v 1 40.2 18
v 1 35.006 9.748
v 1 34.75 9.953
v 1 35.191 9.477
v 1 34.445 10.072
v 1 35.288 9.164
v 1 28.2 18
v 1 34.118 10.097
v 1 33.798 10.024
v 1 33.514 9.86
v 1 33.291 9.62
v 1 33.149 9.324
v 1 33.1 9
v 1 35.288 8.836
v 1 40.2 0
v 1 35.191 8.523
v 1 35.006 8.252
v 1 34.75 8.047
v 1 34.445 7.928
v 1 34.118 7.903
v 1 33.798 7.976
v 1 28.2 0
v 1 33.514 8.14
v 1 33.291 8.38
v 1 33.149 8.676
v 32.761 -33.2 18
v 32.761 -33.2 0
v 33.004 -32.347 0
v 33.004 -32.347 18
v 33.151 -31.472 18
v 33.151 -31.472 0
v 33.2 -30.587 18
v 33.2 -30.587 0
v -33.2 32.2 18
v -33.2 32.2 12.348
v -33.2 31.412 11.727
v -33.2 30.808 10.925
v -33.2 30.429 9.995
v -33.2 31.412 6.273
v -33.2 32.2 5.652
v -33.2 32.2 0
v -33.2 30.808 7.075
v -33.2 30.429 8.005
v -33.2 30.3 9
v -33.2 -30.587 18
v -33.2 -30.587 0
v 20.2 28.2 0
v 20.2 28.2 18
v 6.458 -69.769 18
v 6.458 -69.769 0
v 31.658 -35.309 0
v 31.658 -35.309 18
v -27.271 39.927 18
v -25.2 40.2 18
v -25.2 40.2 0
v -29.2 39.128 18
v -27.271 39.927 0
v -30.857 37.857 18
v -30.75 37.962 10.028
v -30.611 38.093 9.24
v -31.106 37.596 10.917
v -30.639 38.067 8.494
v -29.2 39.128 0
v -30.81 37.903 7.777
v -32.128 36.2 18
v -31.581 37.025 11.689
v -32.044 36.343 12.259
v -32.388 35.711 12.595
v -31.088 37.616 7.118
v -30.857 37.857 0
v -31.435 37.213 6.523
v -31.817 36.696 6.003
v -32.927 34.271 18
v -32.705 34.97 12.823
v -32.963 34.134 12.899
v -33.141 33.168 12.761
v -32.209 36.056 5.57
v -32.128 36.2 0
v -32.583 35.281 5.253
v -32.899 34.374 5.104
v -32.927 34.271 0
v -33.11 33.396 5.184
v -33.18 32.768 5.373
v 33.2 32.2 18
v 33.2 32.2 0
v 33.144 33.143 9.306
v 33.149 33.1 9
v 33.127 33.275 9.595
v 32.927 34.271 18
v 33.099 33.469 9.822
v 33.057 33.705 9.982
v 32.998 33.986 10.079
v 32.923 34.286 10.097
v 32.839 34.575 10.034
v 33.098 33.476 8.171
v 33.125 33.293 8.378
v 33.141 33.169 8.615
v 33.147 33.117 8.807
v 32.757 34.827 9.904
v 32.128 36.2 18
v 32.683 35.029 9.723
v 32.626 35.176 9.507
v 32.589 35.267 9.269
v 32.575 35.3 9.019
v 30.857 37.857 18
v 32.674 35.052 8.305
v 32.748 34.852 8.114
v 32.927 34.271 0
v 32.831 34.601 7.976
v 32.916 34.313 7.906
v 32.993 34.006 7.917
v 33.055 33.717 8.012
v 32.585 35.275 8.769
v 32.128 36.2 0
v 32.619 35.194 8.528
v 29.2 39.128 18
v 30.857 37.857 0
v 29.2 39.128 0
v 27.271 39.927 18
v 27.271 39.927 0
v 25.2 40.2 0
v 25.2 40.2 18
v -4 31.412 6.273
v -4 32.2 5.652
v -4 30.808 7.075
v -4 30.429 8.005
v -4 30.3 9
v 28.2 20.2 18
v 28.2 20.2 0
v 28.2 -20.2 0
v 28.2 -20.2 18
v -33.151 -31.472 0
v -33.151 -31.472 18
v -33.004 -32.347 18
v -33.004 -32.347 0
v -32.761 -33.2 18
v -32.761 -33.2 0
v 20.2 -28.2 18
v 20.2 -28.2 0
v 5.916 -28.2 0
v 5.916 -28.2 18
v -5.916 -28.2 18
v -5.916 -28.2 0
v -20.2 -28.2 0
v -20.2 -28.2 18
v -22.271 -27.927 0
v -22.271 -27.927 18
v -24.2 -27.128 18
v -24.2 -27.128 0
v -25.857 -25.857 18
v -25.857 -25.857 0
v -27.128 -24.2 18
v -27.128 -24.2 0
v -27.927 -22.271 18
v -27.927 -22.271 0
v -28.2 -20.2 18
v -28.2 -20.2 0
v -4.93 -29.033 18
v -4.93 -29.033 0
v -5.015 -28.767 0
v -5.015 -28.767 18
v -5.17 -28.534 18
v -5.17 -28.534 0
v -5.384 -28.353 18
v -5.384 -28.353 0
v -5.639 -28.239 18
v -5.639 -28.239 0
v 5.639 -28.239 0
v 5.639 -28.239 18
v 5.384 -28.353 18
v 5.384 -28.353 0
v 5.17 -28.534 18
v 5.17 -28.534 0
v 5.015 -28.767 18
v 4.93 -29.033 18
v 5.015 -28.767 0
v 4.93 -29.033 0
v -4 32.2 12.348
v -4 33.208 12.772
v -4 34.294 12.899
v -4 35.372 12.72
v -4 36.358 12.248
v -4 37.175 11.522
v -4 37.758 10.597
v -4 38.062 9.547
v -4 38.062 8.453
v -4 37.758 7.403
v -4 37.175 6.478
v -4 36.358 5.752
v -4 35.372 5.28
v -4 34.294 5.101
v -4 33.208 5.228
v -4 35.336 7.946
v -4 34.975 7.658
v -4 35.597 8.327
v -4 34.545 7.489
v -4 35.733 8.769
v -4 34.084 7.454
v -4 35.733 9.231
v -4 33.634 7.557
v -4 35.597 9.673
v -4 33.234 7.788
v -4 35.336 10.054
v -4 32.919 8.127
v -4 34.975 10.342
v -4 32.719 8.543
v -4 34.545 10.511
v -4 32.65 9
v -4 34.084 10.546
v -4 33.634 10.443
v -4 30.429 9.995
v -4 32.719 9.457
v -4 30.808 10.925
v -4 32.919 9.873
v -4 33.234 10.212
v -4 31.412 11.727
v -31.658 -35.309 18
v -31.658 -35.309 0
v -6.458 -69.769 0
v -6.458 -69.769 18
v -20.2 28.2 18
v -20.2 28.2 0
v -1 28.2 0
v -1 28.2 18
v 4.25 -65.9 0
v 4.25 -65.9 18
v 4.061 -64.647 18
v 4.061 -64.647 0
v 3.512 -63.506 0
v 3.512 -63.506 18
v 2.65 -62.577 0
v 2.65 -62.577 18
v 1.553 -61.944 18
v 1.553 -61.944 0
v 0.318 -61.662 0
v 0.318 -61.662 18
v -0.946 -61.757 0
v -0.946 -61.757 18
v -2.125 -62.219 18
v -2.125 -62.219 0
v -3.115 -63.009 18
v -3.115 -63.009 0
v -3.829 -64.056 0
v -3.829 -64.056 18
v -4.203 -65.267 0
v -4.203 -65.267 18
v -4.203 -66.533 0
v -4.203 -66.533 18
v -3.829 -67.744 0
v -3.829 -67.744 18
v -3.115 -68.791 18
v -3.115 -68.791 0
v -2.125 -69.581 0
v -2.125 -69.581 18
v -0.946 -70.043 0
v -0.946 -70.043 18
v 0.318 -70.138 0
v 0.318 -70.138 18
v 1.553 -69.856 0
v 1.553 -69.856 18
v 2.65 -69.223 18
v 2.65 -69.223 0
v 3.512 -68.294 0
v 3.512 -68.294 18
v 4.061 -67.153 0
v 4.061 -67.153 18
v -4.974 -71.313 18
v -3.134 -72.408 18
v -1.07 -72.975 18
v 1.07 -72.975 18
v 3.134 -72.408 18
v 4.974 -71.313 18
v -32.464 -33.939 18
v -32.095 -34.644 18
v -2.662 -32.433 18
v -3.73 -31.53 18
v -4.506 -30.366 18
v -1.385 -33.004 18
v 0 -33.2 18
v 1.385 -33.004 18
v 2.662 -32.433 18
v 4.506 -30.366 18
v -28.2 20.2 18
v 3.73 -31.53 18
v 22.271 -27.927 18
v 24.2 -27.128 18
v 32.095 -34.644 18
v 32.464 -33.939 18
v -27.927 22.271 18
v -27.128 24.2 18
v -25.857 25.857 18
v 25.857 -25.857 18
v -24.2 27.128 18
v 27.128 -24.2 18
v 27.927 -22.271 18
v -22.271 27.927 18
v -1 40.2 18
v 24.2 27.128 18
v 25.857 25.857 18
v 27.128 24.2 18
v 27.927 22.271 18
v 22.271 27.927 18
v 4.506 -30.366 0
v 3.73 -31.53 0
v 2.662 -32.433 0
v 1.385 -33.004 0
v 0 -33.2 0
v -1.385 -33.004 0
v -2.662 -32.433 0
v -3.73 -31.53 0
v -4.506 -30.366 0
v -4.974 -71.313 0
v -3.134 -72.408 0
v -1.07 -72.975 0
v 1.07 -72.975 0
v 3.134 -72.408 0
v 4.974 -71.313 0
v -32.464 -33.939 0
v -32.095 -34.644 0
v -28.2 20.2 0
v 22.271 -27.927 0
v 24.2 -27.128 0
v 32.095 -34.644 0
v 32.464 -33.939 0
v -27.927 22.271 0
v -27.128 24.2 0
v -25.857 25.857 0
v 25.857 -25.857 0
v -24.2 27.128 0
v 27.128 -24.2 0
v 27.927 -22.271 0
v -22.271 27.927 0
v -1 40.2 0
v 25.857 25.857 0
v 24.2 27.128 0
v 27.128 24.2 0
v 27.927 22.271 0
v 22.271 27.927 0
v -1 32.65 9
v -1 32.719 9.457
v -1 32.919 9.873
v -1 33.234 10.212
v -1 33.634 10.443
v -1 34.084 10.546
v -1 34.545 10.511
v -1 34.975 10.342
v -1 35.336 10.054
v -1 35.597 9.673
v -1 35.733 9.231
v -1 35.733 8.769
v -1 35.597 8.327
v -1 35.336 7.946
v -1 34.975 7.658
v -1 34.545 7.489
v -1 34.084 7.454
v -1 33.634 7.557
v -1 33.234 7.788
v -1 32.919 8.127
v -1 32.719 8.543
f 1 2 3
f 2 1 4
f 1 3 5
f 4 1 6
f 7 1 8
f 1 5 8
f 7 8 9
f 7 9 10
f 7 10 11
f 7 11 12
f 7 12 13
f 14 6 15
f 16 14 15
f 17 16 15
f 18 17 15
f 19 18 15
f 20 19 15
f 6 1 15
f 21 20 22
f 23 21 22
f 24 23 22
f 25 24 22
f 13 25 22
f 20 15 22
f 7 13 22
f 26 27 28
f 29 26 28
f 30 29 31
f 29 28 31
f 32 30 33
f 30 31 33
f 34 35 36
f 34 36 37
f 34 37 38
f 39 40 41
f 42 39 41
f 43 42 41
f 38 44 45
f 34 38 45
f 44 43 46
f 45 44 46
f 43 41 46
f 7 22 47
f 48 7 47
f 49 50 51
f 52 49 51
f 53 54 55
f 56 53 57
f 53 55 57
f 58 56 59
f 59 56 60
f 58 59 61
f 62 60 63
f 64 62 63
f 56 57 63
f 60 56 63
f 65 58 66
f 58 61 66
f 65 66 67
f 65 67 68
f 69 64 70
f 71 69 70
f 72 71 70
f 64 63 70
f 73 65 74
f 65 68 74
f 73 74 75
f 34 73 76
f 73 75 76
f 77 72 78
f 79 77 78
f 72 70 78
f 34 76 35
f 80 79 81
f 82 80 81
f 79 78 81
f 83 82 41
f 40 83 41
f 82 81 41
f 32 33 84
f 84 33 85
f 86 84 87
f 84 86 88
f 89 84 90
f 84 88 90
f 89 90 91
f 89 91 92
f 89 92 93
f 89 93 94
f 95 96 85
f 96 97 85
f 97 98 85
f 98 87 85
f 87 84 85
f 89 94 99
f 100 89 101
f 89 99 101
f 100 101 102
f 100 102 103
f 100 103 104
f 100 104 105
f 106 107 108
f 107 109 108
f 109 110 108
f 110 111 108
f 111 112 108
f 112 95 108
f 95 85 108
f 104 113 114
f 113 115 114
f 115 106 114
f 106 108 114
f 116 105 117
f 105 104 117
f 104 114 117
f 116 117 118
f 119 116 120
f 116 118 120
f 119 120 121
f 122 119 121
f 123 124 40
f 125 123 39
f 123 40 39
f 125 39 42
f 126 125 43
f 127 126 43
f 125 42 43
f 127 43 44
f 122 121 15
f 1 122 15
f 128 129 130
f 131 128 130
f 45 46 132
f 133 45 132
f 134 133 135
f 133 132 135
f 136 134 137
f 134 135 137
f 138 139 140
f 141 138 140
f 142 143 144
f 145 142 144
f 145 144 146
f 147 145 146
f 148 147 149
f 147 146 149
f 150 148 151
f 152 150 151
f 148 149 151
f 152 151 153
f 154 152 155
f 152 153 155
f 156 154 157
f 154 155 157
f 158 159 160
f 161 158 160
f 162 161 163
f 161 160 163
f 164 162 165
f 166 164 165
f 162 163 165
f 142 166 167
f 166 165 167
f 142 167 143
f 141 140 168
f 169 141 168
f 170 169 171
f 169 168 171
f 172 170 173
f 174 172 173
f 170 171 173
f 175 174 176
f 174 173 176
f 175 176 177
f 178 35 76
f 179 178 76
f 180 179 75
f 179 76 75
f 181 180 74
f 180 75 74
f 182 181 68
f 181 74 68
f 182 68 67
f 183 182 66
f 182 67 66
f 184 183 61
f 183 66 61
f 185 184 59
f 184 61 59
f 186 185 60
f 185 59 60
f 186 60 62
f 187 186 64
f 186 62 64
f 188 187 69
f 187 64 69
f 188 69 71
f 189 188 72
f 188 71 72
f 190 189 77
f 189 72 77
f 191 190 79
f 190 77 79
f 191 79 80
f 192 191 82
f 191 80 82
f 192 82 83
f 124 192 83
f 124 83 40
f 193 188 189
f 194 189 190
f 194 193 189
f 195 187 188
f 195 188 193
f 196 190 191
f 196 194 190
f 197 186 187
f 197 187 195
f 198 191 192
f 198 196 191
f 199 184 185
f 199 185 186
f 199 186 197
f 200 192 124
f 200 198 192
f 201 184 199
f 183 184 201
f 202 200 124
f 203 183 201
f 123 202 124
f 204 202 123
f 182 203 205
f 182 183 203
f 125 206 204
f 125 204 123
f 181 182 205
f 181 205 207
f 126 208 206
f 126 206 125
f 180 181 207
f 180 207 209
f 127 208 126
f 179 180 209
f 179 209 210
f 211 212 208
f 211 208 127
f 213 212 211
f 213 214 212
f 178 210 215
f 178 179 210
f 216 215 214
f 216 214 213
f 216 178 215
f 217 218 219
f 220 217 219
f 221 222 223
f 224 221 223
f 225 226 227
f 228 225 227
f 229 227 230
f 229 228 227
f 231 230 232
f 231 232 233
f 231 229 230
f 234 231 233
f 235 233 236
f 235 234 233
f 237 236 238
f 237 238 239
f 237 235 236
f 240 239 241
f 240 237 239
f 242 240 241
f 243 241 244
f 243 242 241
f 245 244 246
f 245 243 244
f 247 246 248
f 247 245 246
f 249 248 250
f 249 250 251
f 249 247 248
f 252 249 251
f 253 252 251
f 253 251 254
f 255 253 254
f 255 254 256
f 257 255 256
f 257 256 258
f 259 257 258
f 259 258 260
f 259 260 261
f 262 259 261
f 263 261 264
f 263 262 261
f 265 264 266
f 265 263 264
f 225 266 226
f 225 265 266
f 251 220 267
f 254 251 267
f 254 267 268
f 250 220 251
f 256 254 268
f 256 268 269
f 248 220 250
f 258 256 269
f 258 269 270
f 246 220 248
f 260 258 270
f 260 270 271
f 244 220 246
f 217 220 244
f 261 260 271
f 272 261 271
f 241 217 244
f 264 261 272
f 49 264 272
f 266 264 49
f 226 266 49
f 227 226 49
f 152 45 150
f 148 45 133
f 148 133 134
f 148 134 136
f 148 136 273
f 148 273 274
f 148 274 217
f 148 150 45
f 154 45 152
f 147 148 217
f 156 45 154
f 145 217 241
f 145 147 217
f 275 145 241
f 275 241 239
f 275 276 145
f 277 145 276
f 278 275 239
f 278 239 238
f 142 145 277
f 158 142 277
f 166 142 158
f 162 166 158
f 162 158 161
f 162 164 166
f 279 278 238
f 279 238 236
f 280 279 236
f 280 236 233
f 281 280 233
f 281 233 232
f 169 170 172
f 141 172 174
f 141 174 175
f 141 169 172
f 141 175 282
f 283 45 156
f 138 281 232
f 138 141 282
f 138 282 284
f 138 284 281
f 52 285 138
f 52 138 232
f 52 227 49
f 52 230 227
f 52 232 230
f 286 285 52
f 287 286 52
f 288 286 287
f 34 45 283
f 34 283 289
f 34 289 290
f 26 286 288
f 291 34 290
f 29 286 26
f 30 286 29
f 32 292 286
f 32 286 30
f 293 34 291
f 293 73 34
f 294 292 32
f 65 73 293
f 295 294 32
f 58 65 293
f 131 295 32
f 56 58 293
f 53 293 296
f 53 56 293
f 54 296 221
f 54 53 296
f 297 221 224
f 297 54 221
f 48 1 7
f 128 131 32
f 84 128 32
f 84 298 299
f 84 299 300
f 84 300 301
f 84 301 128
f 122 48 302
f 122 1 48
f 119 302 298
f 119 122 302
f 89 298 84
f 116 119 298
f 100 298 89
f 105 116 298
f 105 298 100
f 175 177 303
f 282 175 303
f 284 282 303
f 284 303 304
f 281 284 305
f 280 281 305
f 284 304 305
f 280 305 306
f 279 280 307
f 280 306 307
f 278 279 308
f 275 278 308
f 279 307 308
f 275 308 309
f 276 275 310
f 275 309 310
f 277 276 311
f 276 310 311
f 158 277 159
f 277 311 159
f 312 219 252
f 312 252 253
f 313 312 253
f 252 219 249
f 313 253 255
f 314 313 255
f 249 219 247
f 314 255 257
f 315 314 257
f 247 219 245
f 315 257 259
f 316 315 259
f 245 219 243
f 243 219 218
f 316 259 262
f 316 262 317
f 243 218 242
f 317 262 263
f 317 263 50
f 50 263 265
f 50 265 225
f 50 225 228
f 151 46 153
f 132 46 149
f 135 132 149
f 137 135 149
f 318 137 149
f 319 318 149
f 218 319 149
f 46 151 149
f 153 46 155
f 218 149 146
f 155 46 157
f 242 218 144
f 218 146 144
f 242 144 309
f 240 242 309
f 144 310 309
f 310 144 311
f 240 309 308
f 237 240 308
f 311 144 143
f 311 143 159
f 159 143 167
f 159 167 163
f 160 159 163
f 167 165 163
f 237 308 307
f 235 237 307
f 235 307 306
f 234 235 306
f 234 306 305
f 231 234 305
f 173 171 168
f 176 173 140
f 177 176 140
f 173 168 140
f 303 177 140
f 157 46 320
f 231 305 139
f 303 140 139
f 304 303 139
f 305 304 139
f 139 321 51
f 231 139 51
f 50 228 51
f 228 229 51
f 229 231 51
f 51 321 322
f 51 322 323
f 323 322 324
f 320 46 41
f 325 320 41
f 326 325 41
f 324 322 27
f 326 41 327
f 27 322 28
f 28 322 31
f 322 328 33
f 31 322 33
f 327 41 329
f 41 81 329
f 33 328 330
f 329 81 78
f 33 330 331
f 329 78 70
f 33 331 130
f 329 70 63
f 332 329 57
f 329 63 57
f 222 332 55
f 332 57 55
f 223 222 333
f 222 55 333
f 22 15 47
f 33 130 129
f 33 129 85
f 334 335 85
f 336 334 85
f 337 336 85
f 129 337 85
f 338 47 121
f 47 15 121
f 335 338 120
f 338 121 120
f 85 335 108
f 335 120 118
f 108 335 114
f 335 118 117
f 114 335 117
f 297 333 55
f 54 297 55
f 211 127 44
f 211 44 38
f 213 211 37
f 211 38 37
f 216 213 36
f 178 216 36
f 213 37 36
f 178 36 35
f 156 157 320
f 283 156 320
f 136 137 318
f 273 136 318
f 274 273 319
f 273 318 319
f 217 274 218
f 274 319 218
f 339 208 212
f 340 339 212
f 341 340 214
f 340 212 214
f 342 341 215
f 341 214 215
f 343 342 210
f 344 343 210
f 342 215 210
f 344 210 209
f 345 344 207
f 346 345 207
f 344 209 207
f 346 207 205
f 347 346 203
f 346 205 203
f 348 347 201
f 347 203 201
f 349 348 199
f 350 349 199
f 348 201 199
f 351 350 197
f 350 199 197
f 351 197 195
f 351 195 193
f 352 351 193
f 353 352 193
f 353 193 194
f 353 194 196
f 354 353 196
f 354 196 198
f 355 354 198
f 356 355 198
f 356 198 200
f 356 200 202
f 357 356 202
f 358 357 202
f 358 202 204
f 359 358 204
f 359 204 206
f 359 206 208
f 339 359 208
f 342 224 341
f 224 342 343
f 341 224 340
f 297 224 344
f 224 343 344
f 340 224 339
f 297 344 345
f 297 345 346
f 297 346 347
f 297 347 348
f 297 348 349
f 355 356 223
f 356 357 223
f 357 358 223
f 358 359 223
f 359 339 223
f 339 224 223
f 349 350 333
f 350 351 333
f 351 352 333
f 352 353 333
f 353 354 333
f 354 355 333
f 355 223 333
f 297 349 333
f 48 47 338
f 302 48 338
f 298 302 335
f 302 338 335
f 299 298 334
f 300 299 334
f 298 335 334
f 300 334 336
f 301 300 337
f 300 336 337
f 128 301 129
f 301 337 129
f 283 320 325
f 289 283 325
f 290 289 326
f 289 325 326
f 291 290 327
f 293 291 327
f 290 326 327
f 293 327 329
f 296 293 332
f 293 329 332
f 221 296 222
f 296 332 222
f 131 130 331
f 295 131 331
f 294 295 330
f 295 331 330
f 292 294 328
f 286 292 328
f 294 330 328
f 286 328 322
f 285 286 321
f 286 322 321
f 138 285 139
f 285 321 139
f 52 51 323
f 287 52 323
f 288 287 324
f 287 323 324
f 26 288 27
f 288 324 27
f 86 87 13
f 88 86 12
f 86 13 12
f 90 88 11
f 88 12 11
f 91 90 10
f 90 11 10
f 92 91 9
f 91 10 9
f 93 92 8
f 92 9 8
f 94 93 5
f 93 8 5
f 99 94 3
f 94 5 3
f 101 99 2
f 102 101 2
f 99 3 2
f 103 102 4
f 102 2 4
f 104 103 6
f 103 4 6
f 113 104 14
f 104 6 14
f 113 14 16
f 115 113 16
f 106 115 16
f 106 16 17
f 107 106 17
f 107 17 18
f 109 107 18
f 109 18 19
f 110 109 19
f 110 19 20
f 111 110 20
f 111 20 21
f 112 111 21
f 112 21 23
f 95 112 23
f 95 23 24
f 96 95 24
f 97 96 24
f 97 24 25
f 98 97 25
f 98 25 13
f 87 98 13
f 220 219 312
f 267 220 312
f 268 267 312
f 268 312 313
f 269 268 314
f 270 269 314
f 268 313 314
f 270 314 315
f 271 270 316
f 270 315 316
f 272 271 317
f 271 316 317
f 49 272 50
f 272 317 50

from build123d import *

# Parameters (mm, degrees)
F0_R     = 4.25
F1_DEPTH = 18
F2_R     = 1.1
F3_DEPTH = 66.401
F2_R_2   = 1.55
F4_DEPTH = 33.2
F5_DEPTH = 29.2


with BuildPart() as f1:
    # F0 (on Top) → F1 (new body)
    with BuildSketch(Plane.XY):
        with BuildLine():
            ThreePointArc((32.761219, -33.2), (33.089542, -31.911773), (33.2, -30.586961))
            Line((33.2, -30.586961), (33.2, 32.2))
            ThreePointArc((33.2, 32.2), (30.856854, 37.856854), (25.2, 40.2))
            Line((25.2, 40.2), (1, 40.2))
            Line((1, 40.2), (1, 33.2))
            Line((1, 33.2), (1, 28.2))
            Line((1, 28.2), (20.2, 28.2))
            ThreePointArc((20.2, 28.2), (25.856854, 25.856854), (28.2, 20.2))
            Line((28.2, 20.2), (28.2, -20.2))
            ThreePointArc((28.2, -20.2), (25.856854, -25.856854), (20.2, -28.2))
            Line((20.2, -28.2), (5.91608, -28.2))
            ThreePointArc((5.91608, -28.2), (5.270583, -28.436237), (4.930066, -29.033333))
            ThreePointArc((4.930066, -29.033333), (0, -33.2), (-4.930066, -29.033333))
            ThreePointArc((-4.930066, -29.033333), (-5.270583, -28.436237), (-5.91608, -28.2))
            Line((-5.91608, -28.2), (-20.2, -28.2))
            ThreePointArc((-20.2, -28.2), (-25.856854, -25.856854), (-28.2, -20.2))
            Line((-28.2, -20.2), (-28.2, 20.2))
            ThreePointArc((-28.2, 20.2), (-25.856854, 25.856854), (-20.2, 28.2))
            Line((-20.2, 28.2), (-1, 28.2))
            Line((-1, 28.2), (-1, 33.2))
            Line((-1, 33.2), (-1, 40.2))
            Line((-1, 40.2), (-25.2, 40.2))
            ThreePointArc((-25.2, 40.2), (-30.856854, 37.856854), (-33.2, 32.2))
            Line((-33.2, 32.2), (-33.2, -30.586961))
            ThreePointArc((-33.2, -30.586961), (-33.089542, -31.911773), (-32.761219, -33.2))
            ThreePointArc((-32.761219, -33.2), (-32.288285, -34.295898), (-31.657565, -35.309233))
            Line((-31.657565, -35.309233), (-6.457565, -69.769474))
            ThreePointArc((-6.457565, -69.769474), (0, -73.047202), (6.457565, -69.769474))
            Line((6.457565, -69.769474), (31.657565, -35.309233))
            ThreePointArc((31.657565, -35.309233), (32.288285, -34.295898), (32.761219, -33.2))
        make_face()
        with Locations((0, -65.9)):
            Circle(F0_R, mode=Mode.SUBTRACT)
    extrude(amount=F1_DEPTH)

    # F2 (on face) → F3 (cut, through all)
    with BuildSketch(Plane(origin=(-33.2, 0, 0), x_dir=(0, -1, 0), z_dir=(-1, 0, 0))):
        with Locations((-34.2, 9)):
            Circle(F2_R)
    extrude(amount=-F3_DEPTH, mode=Mode.SUBTRACT)

    # F2 (on face) → F4 (cut)
    with BuildSketch(Plane(origin=(-33.2, 0, 0), x_dir=(0, -1, 0), z_dir=(-1, 0, 0))):
        with Locations((-34.2, 9)):
            Circle(F2_R_2)
        with Locations((-34.2, 9)):
            Circle(F2_R, mode=Mode.SUBTRACT)
    extrude(amount=-F4_DEPTH, mode=Mode.SUBTRACT)

    # F2 (on face) → F5 (cut)
    with BuildSketch(Plane(origin=(-33.2, 0, 0), x_dir=(0, -1, 0), z_dir=(-1, 0, 0))):
        with BuildLine():
            Line((-32.2, 5.651866), (-32.2, 12.348134))
            ThreePointArc((-32.2, 12.348134), (-38.1, 9), (-32.2, 5.651866))
        make_face()
        with Locations((-34.2, 9)):
            Circle(F2_R_2, mode=Mode.SUBTRACT)
        with BuildLine():
            ThreePointArc((-32.2, 5.651866), (-30.808098, 7.075162), (-30.3, 9))
            ThreePointArc((-30.3, 9), (-30.808098, 10.924838), (-32.2, 12.348134))
            Line((-32.2, 12.348134), (-32.2, 5.651866))
        make_face()
    extrude(amount=-F5_DEPTH, mode=Mode.SUBTRACT)


solid = f1.part
